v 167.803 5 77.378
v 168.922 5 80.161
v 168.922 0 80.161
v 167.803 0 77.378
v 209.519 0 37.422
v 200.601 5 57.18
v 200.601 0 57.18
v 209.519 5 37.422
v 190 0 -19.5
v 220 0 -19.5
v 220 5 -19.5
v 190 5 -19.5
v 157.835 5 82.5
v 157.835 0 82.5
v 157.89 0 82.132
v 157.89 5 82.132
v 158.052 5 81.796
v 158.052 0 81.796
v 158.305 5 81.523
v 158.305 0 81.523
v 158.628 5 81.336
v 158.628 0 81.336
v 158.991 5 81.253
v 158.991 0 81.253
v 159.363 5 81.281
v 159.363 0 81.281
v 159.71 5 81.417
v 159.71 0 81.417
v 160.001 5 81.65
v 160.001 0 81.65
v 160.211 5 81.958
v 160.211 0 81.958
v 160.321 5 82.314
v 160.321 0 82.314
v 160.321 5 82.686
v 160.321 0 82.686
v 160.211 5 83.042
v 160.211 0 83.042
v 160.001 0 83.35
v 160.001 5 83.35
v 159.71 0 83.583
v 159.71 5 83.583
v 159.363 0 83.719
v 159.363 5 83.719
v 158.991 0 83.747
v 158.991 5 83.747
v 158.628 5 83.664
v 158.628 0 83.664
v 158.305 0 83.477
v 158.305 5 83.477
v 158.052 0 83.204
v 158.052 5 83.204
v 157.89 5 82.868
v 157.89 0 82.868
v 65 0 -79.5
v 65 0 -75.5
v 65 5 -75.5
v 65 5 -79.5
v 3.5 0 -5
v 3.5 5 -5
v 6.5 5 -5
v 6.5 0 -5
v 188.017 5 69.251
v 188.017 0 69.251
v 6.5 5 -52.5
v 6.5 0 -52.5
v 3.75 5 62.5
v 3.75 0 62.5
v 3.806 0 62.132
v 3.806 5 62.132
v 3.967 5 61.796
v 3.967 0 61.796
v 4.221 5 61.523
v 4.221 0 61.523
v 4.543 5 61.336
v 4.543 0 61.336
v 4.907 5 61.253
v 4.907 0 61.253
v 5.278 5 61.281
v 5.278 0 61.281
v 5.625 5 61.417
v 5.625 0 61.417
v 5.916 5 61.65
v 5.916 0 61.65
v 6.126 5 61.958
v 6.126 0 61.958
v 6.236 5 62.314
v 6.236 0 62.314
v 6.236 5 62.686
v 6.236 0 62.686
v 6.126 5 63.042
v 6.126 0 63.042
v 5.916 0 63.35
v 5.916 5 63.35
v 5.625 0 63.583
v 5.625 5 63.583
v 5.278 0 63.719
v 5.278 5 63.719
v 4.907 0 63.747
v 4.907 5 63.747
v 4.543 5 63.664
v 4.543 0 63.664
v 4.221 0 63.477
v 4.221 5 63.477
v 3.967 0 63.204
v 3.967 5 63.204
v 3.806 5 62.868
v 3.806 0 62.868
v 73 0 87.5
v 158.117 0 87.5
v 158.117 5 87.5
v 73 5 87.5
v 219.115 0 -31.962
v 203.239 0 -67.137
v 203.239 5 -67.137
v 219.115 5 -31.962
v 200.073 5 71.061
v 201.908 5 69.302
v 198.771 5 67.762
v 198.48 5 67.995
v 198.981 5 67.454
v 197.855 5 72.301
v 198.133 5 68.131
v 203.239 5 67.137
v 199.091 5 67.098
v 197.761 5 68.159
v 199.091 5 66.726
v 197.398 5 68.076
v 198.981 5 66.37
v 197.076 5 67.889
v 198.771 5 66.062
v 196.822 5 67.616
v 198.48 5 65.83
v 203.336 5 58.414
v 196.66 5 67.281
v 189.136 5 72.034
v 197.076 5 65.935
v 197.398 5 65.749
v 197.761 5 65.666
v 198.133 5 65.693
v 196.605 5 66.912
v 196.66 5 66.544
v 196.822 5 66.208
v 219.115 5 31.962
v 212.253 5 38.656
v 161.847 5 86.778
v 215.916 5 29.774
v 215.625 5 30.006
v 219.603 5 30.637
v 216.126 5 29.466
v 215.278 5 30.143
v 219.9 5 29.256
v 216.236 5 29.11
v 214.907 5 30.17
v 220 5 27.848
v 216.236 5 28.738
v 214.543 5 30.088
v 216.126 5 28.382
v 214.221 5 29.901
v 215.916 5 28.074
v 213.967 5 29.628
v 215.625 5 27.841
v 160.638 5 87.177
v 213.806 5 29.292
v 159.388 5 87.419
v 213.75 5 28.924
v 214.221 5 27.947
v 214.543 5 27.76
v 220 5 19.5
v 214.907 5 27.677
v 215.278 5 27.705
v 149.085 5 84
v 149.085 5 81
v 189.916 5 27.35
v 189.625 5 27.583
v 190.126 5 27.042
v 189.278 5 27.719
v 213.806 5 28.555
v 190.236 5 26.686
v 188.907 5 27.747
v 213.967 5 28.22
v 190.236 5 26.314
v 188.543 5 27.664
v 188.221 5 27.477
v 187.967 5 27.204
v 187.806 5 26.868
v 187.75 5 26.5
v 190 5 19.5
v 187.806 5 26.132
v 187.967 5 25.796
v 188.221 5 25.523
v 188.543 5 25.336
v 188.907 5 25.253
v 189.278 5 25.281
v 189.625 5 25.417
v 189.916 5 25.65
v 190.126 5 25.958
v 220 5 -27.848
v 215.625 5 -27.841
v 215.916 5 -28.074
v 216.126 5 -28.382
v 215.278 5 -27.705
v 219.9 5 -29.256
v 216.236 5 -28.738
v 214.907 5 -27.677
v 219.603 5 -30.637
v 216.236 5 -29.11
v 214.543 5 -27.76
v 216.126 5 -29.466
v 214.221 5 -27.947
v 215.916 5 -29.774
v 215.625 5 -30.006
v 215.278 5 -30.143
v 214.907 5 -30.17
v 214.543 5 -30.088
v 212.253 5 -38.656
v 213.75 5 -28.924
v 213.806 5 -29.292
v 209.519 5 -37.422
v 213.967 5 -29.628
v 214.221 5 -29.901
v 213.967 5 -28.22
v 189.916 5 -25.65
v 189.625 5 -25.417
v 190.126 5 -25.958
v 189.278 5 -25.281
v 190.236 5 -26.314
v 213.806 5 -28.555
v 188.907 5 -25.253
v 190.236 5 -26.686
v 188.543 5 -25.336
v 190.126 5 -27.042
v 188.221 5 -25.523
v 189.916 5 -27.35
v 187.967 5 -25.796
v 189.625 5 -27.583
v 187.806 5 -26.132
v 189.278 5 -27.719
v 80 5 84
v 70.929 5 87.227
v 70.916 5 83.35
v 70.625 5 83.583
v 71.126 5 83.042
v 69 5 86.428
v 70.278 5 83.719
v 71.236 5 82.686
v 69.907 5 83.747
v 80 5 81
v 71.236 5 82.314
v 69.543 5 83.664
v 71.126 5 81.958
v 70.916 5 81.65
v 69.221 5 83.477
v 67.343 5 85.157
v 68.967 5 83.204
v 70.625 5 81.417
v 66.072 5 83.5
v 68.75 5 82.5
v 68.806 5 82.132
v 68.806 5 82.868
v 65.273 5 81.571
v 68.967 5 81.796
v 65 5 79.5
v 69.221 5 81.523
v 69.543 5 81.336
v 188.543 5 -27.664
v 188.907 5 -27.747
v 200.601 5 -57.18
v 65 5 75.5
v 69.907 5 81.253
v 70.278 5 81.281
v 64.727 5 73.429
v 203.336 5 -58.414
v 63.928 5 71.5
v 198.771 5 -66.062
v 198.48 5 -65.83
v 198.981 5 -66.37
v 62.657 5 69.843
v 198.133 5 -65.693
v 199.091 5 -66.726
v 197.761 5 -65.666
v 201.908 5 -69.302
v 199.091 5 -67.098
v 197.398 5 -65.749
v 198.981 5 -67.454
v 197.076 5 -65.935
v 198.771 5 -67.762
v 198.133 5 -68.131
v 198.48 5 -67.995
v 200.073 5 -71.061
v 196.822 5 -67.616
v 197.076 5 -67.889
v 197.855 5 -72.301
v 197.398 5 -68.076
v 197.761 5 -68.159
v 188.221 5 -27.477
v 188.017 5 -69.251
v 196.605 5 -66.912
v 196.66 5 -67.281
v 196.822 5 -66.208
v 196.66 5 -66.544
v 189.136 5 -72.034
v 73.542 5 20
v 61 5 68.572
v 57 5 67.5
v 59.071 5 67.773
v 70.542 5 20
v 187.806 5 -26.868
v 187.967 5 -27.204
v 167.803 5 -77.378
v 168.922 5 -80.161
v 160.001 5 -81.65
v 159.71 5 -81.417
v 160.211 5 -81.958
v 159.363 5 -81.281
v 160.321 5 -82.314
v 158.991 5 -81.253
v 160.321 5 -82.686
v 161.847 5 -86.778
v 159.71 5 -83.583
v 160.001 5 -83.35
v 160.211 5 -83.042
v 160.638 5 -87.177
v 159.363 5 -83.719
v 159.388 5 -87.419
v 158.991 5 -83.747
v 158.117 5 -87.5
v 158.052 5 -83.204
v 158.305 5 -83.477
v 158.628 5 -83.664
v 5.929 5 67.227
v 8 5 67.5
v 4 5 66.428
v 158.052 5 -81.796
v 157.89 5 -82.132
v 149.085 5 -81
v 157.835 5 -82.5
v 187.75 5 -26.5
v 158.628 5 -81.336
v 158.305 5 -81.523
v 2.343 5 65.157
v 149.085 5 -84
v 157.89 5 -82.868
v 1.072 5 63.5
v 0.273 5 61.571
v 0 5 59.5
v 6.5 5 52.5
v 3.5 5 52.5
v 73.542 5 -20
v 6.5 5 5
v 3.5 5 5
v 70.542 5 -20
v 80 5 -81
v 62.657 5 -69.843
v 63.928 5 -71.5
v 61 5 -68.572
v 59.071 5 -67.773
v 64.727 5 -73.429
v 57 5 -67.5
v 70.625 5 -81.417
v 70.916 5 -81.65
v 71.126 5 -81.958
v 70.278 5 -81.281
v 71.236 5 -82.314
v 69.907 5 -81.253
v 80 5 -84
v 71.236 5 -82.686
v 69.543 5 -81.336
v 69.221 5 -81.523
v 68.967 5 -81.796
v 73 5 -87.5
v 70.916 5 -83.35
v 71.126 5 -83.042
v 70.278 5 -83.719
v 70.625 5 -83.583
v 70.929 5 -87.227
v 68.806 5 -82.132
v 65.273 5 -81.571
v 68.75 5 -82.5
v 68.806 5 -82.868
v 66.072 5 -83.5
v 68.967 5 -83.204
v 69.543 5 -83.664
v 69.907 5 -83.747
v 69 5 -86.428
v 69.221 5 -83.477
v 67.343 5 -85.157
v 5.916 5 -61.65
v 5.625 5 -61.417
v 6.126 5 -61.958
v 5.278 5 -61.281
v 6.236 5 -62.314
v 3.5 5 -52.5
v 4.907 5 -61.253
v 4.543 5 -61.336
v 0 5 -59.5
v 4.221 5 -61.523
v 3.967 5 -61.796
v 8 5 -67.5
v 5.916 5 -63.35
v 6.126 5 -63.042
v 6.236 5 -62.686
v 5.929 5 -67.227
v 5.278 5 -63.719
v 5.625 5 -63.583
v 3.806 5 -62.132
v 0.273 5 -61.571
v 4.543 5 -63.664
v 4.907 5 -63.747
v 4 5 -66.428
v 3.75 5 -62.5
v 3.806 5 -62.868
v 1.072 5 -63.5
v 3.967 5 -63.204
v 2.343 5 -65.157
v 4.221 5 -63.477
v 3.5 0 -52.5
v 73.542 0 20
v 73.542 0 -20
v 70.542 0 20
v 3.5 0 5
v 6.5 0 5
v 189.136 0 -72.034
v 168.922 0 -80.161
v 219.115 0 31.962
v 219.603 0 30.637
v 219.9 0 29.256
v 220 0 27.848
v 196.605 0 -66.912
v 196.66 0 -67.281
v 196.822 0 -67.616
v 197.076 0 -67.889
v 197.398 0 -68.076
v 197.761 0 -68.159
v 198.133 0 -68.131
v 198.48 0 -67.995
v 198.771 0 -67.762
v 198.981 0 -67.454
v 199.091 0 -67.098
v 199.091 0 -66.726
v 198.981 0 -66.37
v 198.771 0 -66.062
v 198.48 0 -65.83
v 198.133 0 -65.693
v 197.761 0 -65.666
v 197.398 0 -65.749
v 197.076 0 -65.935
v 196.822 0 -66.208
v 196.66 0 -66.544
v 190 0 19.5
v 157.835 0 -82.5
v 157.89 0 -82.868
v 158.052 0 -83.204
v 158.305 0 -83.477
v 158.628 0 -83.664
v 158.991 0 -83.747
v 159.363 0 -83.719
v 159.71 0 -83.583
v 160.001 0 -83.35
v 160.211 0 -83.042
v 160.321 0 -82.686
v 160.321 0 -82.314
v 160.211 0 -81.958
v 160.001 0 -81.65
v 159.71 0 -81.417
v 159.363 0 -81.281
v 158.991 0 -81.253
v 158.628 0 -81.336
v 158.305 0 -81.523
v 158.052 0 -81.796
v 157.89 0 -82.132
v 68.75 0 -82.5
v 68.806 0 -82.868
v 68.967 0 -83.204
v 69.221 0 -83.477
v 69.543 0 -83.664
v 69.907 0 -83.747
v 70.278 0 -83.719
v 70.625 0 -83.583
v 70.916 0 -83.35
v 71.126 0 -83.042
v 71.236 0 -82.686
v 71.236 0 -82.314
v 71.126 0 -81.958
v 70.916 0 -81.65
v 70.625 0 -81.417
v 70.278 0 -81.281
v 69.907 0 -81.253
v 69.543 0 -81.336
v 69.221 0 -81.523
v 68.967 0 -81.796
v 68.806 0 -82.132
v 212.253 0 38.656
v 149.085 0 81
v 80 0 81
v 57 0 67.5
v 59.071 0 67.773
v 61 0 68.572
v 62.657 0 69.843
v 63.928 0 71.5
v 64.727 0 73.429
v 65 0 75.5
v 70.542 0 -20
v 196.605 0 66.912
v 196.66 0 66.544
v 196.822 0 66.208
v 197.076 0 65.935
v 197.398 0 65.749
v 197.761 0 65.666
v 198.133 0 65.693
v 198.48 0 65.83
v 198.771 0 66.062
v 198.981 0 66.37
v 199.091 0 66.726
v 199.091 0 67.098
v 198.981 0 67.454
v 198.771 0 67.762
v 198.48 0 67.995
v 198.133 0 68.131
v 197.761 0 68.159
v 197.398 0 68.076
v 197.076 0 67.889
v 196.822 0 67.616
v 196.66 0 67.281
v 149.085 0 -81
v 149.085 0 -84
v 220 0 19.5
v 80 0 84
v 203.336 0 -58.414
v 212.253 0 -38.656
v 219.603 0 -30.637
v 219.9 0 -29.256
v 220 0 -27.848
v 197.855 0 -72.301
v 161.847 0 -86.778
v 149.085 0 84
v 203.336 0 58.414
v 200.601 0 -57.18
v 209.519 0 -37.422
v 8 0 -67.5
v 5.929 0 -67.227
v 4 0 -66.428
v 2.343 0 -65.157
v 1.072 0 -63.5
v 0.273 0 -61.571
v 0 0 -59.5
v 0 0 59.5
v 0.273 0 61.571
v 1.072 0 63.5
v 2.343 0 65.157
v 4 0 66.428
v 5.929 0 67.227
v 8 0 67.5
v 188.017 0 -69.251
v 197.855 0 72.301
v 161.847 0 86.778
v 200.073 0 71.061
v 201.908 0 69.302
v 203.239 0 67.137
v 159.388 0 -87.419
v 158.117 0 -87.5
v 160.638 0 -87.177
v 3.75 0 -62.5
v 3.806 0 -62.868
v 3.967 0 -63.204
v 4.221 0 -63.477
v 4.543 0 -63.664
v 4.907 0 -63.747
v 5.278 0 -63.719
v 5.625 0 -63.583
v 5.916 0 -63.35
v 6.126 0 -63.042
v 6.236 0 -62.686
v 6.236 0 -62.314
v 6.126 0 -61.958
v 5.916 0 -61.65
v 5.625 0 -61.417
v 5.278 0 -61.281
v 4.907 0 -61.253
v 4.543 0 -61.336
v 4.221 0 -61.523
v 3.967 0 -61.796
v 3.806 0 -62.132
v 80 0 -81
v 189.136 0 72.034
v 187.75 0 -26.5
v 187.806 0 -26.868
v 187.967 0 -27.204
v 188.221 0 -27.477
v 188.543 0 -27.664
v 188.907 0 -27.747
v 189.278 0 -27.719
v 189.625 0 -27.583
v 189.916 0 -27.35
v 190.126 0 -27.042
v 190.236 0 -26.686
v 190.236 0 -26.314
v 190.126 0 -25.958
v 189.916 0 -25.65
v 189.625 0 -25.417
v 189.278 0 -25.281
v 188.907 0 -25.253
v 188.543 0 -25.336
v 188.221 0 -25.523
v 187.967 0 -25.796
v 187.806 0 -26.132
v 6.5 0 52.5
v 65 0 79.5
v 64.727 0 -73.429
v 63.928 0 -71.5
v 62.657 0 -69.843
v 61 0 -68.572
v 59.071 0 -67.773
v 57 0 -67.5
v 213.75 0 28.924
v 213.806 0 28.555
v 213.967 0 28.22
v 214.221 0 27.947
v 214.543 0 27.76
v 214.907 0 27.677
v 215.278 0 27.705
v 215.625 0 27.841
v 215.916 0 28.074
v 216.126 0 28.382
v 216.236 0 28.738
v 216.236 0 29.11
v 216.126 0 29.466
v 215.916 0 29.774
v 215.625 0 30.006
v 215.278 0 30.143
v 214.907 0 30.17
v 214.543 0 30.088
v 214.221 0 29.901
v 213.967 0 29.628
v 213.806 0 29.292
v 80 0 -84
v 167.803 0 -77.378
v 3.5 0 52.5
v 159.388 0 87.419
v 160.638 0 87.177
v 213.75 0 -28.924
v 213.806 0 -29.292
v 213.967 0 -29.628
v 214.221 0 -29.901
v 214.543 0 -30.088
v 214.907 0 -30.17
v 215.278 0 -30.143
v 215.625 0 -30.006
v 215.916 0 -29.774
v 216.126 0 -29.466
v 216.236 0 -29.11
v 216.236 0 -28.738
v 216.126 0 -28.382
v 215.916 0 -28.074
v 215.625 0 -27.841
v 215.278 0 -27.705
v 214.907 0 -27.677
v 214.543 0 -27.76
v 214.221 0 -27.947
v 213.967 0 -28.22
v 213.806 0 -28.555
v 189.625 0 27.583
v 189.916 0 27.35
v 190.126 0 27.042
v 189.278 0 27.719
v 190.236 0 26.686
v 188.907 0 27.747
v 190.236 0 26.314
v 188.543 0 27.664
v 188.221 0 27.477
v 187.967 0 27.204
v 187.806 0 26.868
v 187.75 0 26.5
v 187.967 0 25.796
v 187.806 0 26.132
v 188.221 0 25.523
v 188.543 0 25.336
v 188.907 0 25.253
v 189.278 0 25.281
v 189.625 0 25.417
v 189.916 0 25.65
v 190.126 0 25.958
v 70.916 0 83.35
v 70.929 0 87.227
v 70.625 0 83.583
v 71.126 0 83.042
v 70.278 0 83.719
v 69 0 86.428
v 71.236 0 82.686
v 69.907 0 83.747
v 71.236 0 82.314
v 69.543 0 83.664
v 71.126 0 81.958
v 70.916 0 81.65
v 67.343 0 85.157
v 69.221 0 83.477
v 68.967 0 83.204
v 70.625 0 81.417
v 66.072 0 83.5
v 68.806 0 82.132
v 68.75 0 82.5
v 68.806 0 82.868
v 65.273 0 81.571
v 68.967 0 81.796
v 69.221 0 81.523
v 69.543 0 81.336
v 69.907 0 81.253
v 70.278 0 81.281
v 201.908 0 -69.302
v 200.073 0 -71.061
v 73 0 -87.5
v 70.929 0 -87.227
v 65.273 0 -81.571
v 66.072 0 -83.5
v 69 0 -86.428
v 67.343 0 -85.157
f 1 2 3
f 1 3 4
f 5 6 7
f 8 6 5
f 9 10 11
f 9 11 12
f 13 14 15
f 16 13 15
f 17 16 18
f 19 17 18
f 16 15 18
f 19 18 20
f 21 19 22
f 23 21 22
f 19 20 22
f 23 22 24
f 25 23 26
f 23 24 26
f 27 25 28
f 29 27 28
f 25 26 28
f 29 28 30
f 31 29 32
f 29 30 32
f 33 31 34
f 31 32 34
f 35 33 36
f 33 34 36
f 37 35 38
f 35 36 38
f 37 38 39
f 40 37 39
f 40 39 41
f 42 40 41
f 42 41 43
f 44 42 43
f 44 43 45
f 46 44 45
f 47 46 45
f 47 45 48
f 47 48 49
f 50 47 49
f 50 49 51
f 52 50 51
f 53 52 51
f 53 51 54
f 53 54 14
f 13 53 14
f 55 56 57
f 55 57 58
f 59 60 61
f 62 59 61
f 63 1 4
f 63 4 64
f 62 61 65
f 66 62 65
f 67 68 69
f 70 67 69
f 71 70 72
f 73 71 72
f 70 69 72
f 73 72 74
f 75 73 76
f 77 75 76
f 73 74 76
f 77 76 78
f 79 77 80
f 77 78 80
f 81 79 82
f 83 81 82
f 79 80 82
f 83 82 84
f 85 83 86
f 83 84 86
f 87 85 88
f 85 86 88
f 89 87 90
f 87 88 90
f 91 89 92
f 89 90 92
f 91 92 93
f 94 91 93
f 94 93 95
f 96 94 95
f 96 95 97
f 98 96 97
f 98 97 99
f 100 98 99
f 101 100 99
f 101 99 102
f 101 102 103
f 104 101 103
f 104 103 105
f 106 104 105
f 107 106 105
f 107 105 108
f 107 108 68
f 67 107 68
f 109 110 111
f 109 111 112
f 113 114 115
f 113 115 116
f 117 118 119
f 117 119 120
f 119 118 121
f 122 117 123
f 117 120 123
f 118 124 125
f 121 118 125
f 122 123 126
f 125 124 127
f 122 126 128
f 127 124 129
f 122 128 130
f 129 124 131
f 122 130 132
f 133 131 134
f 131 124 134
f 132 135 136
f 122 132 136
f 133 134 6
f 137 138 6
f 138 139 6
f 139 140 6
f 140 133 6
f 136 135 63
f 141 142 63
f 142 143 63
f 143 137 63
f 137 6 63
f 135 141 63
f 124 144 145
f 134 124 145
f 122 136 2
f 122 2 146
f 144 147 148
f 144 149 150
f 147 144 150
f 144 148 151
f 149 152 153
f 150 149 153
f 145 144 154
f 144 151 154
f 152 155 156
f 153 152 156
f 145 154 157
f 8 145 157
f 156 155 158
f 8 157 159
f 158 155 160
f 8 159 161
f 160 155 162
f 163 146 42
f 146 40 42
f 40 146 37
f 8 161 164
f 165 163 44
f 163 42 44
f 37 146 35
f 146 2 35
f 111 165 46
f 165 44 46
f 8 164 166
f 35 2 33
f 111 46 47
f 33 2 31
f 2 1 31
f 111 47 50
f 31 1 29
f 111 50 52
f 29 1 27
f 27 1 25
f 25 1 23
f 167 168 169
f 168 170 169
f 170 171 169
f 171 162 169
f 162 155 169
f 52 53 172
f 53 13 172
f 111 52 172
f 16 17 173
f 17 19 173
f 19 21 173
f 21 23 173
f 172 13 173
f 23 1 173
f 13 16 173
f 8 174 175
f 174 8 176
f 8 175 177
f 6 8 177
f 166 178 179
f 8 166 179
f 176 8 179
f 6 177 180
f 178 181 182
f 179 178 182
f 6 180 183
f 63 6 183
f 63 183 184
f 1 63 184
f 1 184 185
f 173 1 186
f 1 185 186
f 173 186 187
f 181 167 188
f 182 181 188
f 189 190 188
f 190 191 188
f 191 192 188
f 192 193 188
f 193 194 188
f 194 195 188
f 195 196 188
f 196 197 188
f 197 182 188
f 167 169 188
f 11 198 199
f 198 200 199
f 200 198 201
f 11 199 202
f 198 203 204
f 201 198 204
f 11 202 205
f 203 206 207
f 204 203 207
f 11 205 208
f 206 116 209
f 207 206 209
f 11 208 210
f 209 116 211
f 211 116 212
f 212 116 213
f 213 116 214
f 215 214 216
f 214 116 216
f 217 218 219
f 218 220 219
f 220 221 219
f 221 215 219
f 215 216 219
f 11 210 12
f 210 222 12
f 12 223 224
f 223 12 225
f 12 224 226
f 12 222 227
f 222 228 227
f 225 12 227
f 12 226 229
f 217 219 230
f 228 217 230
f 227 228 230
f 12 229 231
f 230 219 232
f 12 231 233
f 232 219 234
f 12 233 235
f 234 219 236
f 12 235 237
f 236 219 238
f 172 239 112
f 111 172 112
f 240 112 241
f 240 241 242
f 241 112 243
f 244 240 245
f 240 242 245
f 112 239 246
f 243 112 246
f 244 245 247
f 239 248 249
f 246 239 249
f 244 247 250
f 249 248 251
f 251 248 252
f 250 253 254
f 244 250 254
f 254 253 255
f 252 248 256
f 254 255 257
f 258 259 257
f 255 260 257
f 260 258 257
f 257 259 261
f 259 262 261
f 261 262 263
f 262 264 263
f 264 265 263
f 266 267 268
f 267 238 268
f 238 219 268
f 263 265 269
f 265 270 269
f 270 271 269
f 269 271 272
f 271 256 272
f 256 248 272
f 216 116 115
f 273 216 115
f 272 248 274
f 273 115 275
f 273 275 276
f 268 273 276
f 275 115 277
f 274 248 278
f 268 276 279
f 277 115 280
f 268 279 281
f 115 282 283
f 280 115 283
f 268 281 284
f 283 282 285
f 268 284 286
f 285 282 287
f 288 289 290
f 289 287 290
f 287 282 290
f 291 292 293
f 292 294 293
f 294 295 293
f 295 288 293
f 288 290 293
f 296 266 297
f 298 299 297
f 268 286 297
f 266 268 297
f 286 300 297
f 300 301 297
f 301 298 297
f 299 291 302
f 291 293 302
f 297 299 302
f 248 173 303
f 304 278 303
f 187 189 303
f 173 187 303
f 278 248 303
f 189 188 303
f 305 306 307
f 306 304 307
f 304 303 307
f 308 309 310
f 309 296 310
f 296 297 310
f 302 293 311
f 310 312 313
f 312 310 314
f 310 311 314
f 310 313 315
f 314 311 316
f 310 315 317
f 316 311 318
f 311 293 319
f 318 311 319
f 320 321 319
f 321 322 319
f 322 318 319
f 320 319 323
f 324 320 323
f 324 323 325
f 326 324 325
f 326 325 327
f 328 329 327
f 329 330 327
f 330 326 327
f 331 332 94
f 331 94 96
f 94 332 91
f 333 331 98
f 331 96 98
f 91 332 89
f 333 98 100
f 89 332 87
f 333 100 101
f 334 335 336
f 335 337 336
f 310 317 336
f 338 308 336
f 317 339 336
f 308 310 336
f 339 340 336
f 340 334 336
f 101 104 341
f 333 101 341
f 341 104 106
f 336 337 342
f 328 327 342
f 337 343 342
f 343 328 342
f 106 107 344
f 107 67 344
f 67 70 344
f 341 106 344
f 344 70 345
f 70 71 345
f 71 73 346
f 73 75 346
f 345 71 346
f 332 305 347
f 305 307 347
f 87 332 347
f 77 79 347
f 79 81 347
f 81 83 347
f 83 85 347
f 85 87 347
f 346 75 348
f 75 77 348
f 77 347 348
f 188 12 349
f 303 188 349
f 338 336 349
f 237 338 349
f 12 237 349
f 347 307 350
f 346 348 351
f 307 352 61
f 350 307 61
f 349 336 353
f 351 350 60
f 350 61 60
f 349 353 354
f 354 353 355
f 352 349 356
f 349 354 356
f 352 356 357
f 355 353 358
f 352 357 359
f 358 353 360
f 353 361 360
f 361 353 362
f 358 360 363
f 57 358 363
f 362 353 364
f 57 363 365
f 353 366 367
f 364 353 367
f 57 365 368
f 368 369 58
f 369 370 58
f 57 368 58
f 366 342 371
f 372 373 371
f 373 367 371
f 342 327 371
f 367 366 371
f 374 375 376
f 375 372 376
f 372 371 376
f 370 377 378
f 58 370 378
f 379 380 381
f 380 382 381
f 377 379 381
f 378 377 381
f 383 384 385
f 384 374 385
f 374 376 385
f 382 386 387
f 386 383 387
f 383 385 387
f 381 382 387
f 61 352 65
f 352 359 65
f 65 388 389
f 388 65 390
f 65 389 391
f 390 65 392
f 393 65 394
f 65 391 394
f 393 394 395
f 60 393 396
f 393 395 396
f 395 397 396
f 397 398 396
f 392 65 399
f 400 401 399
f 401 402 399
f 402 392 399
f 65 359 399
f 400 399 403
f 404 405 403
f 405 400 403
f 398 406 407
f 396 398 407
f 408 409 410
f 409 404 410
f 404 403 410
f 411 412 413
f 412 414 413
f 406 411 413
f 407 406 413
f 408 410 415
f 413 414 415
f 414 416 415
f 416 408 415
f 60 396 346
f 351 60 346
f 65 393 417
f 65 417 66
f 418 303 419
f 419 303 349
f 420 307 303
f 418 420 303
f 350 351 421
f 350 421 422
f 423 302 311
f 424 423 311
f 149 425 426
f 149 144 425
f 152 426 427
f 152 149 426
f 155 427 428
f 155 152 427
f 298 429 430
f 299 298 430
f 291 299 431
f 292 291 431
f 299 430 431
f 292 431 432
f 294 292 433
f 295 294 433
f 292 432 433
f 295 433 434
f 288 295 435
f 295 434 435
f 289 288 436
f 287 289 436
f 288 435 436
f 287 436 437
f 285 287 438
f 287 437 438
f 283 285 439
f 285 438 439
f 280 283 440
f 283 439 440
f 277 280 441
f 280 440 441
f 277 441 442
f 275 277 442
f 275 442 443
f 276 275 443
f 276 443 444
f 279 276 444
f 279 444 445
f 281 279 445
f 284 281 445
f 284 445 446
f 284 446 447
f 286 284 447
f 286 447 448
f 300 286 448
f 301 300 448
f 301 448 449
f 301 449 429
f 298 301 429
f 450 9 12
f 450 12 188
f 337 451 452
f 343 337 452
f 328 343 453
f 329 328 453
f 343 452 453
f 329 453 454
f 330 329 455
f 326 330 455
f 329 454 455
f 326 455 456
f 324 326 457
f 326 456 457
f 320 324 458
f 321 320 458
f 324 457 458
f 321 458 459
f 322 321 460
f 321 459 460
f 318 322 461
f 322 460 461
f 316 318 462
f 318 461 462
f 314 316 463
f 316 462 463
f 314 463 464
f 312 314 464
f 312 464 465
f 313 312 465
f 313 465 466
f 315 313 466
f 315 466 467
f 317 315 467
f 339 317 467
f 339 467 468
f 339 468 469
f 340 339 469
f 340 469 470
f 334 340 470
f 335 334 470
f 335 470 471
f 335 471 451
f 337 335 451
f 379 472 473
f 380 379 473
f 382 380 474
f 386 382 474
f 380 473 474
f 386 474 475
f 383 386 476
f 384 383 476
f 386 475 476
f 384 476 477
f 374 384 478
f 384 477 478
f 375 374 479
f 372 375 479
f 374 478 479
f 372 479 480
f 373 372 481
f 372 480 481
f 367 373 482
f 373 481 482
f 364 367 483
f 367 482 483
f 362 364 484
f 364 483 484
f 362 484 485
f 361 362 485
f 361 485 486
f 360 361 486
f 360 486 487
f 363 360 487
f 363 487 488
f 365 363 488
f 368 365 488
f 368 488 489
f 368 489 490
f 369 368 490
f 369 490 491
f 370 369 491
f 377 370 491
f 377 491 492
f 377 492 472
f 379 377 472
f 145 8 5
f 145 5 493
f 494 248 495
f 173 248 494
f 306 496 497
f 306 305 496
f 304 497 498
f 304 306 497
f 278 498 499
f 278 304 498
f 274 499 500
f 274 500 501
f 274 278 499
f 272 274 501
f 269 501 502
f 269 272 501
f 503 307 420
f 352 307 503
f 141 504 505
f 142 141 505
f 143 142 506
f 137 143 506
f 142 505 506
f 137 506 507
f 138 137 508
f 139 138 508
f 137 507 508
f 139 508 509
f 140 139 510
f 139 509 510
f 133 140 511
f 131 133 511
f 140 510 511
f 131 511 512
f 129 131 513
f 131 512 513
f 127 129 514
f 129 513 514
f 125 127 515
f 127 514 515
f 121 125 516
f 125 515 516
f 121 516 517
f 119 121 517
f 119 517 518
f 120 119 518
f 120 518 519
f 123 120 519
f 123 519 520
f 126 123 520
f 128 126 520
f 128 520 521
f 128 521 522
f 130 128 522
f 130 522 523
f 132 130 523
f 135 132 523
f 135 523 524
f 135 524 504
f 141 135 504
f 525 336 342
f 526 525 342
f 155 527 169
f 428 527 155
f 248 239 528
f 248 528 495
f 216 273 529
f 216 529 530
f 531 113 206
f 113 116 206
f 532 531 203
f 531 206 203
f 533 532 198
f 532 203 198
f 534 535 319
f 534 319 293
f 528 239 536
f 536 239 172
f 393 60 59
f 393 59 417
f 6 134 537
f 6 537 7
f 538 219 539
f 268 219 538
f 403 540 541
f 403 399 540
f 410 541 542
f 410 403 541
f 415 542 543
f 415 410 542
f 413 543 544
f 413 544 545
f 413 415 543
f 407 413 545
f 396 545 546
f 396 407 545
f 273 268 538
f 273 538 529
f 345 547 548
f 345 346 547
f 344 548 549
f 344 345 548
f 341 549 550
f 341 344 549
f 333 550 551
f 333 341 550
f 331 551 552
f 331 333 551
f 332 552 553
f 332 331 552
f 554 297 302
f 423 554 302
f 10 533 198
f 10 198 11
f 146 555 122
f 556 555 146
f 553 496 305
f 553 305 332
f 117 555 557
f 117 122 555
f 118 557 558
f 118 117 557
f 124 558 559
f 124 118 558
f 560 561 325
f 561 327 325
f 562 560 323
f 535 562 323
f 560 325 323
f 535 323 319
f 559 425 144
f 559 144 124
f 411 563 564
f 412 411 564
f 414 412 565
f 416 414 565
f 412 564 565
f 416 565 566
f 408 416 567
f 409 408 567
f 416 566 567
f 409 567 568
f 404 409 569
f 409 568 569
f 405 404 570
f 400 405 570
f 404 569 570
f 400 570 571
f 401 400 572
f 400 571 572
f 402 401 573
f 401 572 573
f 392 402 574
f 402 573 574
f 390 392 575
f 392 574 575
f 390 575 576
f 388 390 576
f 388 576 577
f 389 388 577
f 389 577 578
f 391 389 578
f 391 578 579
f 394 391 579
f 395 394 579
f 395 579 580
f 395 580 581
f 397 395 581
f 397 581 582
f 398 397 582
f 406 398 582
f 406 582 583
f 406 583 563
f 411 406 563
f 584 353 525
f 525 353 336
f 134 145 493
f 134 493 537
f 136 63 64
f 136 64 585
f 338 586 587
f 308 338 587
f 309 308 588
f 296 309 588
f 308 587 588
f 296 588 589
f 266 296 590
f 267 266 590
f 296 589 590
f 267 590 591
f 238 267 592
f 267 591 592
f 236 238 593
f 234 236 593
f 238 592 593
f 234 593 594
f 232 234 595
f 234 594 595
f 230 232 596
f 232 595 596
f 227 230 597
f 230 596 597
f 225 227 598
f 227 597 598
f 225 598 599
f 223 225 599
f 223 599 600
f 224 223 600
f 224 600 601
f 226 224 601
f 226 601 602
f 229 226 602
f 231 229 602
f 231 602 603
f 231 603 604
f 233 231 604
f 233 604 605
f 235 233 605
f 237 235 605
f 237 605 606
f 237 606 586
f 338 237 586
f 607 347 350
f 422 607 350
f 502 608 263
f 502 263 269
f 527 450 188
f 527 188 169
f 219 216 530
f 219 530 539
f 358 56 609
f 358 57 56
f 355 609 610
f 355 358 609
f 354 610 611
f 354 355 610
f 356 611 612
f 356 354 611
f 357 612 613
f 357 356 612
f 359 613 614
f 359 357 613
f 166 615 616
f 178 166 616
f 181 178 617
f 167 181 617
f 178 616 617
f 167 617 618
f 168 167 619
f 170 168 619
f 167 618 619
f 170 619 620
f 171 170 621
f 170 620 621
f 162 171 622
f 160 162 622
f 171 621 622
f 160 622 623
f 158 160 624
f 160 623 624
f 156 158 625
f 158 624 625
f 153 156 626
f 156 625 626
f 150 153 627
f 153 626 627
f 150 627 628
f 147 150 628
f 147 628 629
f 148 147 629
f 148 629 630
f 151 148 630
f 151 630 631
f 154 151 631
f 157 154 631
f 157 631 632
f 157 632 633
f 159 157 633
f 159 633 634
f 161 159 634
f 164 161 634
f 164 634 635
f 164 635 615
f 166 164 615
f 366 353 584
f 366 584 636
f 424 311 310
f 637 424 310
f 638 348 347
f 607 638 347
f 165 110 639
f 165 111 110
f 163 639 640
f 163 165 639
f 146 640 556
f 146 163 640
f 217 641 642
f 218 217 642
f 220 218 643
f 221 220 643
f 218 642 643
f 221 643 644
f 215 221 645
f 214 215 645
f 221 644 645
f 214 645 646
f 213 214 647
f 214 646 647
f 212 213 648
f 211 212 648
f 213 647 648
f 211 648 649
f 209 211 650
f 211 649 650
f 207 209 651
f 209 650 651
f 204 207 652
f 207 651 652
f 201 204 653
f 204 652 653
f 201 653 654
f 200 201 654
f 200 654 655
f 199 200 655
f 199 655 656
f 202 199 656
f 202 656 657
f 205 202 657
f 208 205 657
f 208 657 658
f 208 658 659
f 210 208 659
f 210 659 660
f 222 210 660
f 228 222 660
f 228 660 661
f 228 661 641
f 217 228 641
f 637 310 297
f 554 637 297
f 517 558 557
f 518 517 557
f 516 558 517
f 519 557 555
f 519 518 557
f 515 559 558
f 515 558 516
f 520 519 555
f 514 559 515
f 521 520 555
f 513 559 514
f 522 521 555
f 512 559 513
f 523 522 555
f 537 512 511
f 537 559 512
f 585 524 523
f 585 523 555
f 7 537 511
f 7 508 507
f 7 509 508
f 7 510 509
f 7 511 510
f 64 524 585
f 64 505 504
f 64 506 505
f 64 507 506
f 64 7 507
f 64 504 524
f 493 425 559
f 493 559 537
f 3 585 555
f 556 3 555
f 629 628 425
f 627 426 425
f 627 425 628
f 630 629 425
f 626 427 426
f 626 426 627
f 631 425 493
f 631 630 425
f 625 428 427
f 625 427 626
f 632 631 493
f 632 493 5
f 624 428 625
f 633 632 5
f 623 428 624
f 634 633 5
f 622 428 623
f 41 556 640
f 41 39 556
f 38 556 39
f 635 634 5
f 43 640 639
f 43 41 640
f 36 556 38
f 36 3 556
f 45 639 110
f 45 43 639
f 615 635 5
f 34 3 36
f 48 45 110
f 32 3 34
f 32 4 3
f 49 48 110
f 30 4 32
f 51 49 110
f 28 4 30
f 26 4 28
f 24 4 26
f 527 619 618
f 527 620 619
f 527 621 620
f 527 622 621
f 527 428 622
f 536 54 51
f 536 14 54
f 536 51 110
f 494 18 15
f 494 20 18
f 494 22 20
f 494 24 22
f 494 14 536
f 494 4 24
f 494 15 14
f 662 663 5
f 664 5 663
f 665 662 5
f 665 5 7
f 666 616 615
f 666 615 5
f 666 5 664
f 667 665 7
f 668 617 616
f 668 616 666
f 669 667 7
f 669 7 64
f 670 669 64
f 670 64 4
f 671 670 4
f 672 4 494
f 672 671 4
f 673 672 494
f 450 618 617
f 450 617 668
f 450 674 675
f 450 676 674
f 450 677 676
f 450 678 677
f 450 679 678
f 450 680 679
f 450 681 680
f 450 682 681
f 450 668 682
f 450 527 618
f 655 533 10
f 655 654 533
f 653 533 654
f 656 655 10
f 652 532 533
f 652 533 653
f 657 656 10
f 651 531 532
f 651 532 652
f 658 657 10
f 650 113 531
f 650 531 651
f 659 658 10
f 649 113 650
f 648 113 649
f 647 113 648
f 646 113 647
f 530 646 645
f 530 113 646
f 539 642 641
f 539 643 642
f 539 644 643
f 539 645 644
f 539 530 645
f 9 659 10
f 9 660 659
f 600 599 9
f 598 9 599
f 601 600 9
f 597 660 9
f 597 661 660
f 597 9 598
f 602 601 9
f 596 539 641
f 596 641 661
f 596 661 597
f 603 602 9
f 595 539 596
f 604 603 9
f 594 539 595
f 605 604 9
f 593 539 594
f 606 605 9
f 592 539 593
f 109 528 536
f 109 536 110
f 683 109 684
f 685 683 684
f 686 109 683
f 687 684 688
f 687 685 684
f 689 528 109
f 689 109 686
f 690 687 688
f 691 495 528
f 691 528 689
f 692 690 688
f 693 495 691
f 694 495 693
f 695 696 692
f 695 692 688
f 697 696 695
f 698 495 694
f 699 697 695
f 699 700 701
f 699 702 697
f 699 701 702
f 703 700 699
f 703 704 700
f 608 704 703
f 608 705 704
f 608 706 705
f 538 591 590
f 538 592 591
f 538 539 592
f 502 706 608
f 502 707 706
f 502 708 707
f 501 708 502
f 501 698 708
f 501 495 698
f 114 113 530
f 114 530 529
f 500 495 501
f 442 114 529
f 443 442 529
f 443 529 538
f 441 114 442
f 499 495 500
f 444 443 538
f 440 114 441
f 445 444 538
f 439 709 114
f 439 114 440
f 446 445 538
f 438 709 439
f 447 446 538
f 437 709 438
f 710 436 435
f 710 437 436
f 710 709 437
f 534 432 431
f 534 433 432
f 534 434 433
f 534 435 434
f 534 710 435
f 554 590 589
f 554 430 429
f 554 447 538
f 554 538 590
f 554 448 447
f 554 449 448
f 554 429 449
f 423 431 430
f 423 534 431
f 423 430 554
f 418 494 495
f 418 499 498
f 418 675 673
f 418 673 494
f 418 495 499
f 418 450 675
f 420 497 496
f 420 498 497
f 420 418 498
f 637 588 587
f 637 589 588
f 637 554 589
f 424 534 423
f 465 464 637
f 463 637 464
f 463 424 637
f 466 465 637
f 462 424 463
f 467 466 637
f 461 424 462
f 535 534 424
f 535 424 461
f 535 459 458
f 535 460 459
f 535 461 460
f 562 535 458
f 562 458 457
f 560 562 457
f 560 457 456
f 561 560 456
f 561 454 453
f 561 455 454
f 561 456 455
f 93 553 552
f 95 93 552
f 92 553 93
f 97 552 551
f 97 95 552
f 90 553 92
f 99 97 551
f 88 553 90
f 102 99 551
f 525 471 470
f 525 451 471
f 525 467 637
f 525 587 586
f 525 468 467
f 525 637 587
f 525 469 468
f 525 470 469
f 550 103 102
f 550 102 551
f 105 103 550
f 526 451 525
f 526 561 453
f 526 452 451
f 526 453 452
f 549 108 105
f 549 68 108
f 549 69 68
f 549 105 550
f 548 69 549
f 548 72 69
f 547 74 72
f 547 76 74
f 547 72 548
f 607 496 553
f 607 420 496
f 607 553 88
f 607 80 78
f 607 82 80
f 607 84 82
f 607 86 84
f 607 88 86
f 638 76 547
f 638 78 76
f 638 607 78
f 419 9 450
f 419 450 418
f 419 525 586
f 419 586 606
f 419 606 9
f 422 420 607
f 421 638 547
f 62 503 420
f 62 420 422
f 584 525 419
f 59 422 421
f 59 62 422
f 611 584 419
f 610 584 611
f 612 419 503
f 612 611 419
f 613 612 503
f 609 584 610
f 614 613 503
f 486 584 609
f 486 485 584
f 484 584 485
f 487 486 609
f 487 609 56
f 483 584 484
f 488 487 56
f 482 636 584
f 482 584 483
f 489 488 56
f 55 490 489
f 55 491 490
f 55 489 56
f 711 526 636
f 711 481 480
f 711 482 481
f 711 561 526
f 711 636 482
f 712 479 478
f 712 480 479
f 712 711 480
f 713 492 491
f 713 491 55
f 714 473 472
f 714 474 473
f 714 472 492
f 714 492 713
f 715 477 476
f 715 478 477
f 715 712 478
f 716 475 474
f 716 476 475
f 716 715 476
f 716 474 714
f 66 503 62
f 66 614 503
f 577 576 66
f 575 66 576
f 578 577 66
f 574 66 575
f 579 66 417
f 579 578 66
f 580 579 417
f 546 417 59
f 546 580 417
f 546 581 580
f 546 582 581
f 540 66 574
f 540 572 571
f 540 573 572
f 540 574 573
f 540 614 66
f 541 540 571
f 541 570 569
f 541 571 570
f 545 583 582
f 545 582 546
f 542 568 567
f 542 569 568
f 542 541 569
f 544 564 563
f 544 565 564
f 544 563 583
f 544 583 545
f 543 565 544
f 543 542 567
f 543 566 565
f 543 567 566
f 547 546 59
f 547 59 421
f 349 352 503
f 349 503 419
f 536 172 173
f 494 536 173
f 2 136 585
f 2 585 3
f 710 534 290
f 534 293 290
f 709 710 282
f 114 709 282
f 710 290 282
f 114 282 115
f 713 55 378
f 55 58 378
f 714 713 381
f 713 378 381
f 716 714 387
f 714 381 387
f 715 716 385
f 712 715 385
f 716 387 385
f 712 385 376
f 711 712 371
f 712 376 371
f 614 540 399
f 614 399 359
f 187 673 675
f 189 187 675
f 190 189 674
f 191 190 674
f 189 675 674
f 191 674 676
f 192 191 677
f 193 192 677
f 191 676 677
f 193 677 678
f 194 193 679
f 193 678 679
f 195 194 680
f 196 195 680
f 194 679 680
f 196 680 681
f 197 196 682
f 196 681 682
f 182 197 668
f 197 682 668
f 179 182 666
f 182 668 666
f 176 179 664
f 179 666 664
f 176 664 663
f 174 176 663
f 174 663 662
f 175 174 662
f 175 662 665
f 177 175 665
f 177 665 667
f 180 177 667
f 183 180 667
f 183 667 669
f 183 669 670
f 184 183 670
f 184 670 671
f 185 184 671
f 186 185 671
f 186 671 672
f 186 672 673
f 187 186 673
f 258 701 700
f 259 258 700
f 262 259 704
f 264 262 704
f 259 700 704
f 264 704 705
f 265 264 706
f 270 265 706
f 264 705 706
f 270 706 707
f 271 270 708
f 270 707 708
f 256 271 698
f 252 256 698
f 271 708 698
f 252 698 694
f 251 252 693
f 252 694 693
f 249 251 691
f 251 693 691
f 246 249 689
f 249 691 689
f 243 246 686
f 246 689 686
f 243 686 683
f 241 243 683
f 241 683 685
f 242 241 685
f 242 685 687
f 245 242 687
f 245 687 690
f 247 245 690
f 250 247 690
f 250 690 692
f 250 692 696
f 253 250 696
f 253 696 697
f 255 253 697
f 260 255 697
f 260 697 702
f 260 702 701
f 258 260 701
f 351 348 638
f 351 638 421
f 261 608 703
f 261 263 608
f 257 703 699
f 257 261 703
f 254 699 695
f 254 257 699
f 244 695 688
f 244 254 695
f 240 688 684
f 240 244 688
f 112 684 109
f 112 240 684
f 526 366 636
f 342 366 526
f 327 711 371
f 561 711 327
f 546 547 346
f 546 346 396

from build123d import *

# Parameters (mm, degrees)
ESTRUSIONE_ESTRUSIONE1_DEPTH  = 5
FORO_FILETTATO_M3X0_5_1_D     = 2.5
FORO_FILETTATO_M3X0_5_1_DEPTH = 7.5
FORO_FILETTATO_M3X0_5_1_TIP   = 0.751075774
SCHIZZO4_W                    = 69.084596206
SCHIZZO4_H                    = 3
TAGLIO_ESTRUSIONE2_DEPTH      = 10
SCHIZZO7_W                    = 3
SCHIZZO7_H                    = 47.5
TAGLIO_ESTRUSIONE5_DEPTH      = 10
SCHIZZO12_W                   = 3
SCHIZZO12_H                   = 40
TAGLIO_ESTRUSIONE8_DEPTH      = 237.814801058
TAGLIO_ESTRUSIONE1_DEPTH      = 237.814801058
TAGLIO_ESTRUSIONE1_DEPTH_BACK = 237.814801058
FORO_FILETTATO_M3X0_5_4_D     = 2.5
RACCORDO1_R                   = 8
RACCORDO2_R                   = 10


with BuildPart() as part:
    # Schizzo1 → Estrusione-Estrusione1 (new body)
    with BuildSketch(Plane(origin=(0, 0, 0), x_dir=(1, 0, 0), z_dir=(0, 1, 0))):
        Polygon((65, 67.5), (65, 87.5), (160.052105959, 87.5), (201.585225273, 70.801270189), (220, 30), (220, -30), (201.585225273, -70.801270189), (160.052105959, -87.5), (65, -87.5), (65, -67.5), (0, -67.5), (0, 67.5), align=None)
    extrude(amount=ESTRUSIONE_ESTRUSIONE1_DEPTH)

    # Foro filettato M3x0.5-1
    with Locations(Plane(origin=(0, 5, 0), x_dir=(1, 0, 0), z_dir=(0, 1, 0))):
        with Locations((197.854862265, 66.912097904), (215, 28.92393853), (215, -28.92393853), (197.854862265, -66.912097904), (159.084596206, -82.5), (159.084596206, 82.5), (70, 82.5), (70, -82.5), (5, -62.5), (5, 62.5)):
            Hole(FORO_FILETTATO_M3X0_5_1_D / 2, depth=FORO_FILETTATO_M3X0_5_1_DEPTH)
            with Locations((0, 0, -(FORO_FILETTATO_M3X0_5_1_DEPTH + FORO_FILETTATO_M3X0_5_1_TIP / 2))):  # 118° drill point
                Cone(0, FORO_FILETTATO_M3X0_5_1_D / 2, FORO_FILETTATO_M3X0_5_1_TIP, mode=Mode.SUBTRACT)

    # Schizzo4 → Taglio-Estrusione2 (cut)
    with BuildSketch(Plane(origin=(0, 5, 0), x_dir=(1, 0, 0), z_dir=(0, 1, 0))):
        with Locations((114.542298103, -82.5)):
            Rectangle(SCHIZZO4_W, SCHIZZO4_H)
        Polygon((209.519084515, 37.421559693), (200.601374282, 57.180362615), (203.33577775, 58.414476741), (212.253487983, 38.655673819), align=None)
        with Locations((114.542298103, 82.5)):
            Rectangle(SCHIZZO4_W, SCHIZZO4_H)
        Polygon((189.136249234, 72.034186035), (168.92231814, 80.161362114), (167.803209237, 77.377911869), (188.017140331, 69.250735791), align=None)
        Polygon((167.803209237, -77.377911869), (188.017140331, -69.250735791), (189.136249234, -72.034186035), (168.92231814, -80.161362114), align=None)
        Polygon((200.601374282, -57.180362615), (209.519084515, -37.421559693), (212.253487983, -38.655673819), (203.33577775, -58.414476741), align=None)
    extrude(amount=-TAGLIO_ESTRUSIONE2_DEPTH, mode=Mode.SUBTRACT)

    # Schizzo7 → Taglio-Estrusione5 (cut)
    with BuildSketch(Plane(origin=(0, 5, 0), x_dir=(1, 0, 0), z_dir=(0, 1, 0))):
        with Locations((5, 28.75)):
            Rectangle(SCHIZZO7_W, SCHIZZO7_H)
        with Locations((5, -28.75)):
            Rectangle(SCHIZZO7_W, SCHIZZO7_H)
    extrude(amount=-TAGLIO_ESTRUSIONE5_DEPTH, mode=Mode.SUBTRACT)

    # Schizzo12 → Taglio-Estrusione8 (cut, through all)
    with BuildSketch(Plane(origin=(0, 5, 0), x_dir=(1, 0, 0), z_dir=(0, 1, 0))):
        with Locations((72.042298103, 0)):
            Rectangle(SCHIZZO12_W, SCHIZZO12_H)
    extrude(amount=-TAGLIO_ESTRUSIONE8_DEPTH, mode=Mode.SUBTRACT)

    # Schizzo2 → Taglio-Estrusione1 (cut, two sides: drawn at the far end of the back side and taken through both)
    with BuildSketch(Plane(origin=(0, 5, 0), x_dir=(1, 0, 0), z_dir=(0, 1, 0)).offset(-TAGLIO_ESTRUSIONE1_DEPTH_BACK)):
        Polygon((719.281105296, 19.5), (220, 19.5), (190, 19.5), (190, -19.5), (220, -19.5), (719.281105296, -19.5), (1717.843315889, -19.5), (1717.843315889, 19.5), align=None)
    extrude(amount=TAGLIO_ESTRUSIONE1_DEPTH + TAGLIO_ESTRUSIONE1_DEPTH_BACK, mode=Mode.SUBTRACT)

    # Foro filettato M3x0.5-4 (through all)
    with Locations(Plane(origin=(0, 5, 0), x_dir=(1, 0, 0), z_dir=(0, 1, 0))):
        with Locations((189, 26.5), (189, -26.5)):
            Hole(FORO_FILETTATO_M3X0_5_4_D / 2)

    # Raccordo1
    raccordo1_edges = [part.edges().sort_by_distance(p)[0] for p in [
        (0, 2.5, -67.5),
        (65, 2.5, -67.5),
        (65, 2.5, -87.5),
        (65, 2.5, 87.5),
        (65, 2.5, 67.5),
        (0, 2.5, 67.5),
    ]]
    fillet(raccordo1_edges, radius=RACCORDO1_R)

    # Raccordo2
    raccordo2_edges = [part.edges().sort_by_distance(p)[0] for p in [
        (160.052105959, 2.5, -87.5),
        (201.585225273, 2.5, -70.801270189),
        (220, 2.5, -30),
        (220, 2.5, 30),
        (201.585225273, 2.5, 70.801270189),
        (160.052105959, 2.5, 87.5),
    ]]
    fillet(raccordo2_edges, radius=RACCORDO2_R)


solid = part.part
